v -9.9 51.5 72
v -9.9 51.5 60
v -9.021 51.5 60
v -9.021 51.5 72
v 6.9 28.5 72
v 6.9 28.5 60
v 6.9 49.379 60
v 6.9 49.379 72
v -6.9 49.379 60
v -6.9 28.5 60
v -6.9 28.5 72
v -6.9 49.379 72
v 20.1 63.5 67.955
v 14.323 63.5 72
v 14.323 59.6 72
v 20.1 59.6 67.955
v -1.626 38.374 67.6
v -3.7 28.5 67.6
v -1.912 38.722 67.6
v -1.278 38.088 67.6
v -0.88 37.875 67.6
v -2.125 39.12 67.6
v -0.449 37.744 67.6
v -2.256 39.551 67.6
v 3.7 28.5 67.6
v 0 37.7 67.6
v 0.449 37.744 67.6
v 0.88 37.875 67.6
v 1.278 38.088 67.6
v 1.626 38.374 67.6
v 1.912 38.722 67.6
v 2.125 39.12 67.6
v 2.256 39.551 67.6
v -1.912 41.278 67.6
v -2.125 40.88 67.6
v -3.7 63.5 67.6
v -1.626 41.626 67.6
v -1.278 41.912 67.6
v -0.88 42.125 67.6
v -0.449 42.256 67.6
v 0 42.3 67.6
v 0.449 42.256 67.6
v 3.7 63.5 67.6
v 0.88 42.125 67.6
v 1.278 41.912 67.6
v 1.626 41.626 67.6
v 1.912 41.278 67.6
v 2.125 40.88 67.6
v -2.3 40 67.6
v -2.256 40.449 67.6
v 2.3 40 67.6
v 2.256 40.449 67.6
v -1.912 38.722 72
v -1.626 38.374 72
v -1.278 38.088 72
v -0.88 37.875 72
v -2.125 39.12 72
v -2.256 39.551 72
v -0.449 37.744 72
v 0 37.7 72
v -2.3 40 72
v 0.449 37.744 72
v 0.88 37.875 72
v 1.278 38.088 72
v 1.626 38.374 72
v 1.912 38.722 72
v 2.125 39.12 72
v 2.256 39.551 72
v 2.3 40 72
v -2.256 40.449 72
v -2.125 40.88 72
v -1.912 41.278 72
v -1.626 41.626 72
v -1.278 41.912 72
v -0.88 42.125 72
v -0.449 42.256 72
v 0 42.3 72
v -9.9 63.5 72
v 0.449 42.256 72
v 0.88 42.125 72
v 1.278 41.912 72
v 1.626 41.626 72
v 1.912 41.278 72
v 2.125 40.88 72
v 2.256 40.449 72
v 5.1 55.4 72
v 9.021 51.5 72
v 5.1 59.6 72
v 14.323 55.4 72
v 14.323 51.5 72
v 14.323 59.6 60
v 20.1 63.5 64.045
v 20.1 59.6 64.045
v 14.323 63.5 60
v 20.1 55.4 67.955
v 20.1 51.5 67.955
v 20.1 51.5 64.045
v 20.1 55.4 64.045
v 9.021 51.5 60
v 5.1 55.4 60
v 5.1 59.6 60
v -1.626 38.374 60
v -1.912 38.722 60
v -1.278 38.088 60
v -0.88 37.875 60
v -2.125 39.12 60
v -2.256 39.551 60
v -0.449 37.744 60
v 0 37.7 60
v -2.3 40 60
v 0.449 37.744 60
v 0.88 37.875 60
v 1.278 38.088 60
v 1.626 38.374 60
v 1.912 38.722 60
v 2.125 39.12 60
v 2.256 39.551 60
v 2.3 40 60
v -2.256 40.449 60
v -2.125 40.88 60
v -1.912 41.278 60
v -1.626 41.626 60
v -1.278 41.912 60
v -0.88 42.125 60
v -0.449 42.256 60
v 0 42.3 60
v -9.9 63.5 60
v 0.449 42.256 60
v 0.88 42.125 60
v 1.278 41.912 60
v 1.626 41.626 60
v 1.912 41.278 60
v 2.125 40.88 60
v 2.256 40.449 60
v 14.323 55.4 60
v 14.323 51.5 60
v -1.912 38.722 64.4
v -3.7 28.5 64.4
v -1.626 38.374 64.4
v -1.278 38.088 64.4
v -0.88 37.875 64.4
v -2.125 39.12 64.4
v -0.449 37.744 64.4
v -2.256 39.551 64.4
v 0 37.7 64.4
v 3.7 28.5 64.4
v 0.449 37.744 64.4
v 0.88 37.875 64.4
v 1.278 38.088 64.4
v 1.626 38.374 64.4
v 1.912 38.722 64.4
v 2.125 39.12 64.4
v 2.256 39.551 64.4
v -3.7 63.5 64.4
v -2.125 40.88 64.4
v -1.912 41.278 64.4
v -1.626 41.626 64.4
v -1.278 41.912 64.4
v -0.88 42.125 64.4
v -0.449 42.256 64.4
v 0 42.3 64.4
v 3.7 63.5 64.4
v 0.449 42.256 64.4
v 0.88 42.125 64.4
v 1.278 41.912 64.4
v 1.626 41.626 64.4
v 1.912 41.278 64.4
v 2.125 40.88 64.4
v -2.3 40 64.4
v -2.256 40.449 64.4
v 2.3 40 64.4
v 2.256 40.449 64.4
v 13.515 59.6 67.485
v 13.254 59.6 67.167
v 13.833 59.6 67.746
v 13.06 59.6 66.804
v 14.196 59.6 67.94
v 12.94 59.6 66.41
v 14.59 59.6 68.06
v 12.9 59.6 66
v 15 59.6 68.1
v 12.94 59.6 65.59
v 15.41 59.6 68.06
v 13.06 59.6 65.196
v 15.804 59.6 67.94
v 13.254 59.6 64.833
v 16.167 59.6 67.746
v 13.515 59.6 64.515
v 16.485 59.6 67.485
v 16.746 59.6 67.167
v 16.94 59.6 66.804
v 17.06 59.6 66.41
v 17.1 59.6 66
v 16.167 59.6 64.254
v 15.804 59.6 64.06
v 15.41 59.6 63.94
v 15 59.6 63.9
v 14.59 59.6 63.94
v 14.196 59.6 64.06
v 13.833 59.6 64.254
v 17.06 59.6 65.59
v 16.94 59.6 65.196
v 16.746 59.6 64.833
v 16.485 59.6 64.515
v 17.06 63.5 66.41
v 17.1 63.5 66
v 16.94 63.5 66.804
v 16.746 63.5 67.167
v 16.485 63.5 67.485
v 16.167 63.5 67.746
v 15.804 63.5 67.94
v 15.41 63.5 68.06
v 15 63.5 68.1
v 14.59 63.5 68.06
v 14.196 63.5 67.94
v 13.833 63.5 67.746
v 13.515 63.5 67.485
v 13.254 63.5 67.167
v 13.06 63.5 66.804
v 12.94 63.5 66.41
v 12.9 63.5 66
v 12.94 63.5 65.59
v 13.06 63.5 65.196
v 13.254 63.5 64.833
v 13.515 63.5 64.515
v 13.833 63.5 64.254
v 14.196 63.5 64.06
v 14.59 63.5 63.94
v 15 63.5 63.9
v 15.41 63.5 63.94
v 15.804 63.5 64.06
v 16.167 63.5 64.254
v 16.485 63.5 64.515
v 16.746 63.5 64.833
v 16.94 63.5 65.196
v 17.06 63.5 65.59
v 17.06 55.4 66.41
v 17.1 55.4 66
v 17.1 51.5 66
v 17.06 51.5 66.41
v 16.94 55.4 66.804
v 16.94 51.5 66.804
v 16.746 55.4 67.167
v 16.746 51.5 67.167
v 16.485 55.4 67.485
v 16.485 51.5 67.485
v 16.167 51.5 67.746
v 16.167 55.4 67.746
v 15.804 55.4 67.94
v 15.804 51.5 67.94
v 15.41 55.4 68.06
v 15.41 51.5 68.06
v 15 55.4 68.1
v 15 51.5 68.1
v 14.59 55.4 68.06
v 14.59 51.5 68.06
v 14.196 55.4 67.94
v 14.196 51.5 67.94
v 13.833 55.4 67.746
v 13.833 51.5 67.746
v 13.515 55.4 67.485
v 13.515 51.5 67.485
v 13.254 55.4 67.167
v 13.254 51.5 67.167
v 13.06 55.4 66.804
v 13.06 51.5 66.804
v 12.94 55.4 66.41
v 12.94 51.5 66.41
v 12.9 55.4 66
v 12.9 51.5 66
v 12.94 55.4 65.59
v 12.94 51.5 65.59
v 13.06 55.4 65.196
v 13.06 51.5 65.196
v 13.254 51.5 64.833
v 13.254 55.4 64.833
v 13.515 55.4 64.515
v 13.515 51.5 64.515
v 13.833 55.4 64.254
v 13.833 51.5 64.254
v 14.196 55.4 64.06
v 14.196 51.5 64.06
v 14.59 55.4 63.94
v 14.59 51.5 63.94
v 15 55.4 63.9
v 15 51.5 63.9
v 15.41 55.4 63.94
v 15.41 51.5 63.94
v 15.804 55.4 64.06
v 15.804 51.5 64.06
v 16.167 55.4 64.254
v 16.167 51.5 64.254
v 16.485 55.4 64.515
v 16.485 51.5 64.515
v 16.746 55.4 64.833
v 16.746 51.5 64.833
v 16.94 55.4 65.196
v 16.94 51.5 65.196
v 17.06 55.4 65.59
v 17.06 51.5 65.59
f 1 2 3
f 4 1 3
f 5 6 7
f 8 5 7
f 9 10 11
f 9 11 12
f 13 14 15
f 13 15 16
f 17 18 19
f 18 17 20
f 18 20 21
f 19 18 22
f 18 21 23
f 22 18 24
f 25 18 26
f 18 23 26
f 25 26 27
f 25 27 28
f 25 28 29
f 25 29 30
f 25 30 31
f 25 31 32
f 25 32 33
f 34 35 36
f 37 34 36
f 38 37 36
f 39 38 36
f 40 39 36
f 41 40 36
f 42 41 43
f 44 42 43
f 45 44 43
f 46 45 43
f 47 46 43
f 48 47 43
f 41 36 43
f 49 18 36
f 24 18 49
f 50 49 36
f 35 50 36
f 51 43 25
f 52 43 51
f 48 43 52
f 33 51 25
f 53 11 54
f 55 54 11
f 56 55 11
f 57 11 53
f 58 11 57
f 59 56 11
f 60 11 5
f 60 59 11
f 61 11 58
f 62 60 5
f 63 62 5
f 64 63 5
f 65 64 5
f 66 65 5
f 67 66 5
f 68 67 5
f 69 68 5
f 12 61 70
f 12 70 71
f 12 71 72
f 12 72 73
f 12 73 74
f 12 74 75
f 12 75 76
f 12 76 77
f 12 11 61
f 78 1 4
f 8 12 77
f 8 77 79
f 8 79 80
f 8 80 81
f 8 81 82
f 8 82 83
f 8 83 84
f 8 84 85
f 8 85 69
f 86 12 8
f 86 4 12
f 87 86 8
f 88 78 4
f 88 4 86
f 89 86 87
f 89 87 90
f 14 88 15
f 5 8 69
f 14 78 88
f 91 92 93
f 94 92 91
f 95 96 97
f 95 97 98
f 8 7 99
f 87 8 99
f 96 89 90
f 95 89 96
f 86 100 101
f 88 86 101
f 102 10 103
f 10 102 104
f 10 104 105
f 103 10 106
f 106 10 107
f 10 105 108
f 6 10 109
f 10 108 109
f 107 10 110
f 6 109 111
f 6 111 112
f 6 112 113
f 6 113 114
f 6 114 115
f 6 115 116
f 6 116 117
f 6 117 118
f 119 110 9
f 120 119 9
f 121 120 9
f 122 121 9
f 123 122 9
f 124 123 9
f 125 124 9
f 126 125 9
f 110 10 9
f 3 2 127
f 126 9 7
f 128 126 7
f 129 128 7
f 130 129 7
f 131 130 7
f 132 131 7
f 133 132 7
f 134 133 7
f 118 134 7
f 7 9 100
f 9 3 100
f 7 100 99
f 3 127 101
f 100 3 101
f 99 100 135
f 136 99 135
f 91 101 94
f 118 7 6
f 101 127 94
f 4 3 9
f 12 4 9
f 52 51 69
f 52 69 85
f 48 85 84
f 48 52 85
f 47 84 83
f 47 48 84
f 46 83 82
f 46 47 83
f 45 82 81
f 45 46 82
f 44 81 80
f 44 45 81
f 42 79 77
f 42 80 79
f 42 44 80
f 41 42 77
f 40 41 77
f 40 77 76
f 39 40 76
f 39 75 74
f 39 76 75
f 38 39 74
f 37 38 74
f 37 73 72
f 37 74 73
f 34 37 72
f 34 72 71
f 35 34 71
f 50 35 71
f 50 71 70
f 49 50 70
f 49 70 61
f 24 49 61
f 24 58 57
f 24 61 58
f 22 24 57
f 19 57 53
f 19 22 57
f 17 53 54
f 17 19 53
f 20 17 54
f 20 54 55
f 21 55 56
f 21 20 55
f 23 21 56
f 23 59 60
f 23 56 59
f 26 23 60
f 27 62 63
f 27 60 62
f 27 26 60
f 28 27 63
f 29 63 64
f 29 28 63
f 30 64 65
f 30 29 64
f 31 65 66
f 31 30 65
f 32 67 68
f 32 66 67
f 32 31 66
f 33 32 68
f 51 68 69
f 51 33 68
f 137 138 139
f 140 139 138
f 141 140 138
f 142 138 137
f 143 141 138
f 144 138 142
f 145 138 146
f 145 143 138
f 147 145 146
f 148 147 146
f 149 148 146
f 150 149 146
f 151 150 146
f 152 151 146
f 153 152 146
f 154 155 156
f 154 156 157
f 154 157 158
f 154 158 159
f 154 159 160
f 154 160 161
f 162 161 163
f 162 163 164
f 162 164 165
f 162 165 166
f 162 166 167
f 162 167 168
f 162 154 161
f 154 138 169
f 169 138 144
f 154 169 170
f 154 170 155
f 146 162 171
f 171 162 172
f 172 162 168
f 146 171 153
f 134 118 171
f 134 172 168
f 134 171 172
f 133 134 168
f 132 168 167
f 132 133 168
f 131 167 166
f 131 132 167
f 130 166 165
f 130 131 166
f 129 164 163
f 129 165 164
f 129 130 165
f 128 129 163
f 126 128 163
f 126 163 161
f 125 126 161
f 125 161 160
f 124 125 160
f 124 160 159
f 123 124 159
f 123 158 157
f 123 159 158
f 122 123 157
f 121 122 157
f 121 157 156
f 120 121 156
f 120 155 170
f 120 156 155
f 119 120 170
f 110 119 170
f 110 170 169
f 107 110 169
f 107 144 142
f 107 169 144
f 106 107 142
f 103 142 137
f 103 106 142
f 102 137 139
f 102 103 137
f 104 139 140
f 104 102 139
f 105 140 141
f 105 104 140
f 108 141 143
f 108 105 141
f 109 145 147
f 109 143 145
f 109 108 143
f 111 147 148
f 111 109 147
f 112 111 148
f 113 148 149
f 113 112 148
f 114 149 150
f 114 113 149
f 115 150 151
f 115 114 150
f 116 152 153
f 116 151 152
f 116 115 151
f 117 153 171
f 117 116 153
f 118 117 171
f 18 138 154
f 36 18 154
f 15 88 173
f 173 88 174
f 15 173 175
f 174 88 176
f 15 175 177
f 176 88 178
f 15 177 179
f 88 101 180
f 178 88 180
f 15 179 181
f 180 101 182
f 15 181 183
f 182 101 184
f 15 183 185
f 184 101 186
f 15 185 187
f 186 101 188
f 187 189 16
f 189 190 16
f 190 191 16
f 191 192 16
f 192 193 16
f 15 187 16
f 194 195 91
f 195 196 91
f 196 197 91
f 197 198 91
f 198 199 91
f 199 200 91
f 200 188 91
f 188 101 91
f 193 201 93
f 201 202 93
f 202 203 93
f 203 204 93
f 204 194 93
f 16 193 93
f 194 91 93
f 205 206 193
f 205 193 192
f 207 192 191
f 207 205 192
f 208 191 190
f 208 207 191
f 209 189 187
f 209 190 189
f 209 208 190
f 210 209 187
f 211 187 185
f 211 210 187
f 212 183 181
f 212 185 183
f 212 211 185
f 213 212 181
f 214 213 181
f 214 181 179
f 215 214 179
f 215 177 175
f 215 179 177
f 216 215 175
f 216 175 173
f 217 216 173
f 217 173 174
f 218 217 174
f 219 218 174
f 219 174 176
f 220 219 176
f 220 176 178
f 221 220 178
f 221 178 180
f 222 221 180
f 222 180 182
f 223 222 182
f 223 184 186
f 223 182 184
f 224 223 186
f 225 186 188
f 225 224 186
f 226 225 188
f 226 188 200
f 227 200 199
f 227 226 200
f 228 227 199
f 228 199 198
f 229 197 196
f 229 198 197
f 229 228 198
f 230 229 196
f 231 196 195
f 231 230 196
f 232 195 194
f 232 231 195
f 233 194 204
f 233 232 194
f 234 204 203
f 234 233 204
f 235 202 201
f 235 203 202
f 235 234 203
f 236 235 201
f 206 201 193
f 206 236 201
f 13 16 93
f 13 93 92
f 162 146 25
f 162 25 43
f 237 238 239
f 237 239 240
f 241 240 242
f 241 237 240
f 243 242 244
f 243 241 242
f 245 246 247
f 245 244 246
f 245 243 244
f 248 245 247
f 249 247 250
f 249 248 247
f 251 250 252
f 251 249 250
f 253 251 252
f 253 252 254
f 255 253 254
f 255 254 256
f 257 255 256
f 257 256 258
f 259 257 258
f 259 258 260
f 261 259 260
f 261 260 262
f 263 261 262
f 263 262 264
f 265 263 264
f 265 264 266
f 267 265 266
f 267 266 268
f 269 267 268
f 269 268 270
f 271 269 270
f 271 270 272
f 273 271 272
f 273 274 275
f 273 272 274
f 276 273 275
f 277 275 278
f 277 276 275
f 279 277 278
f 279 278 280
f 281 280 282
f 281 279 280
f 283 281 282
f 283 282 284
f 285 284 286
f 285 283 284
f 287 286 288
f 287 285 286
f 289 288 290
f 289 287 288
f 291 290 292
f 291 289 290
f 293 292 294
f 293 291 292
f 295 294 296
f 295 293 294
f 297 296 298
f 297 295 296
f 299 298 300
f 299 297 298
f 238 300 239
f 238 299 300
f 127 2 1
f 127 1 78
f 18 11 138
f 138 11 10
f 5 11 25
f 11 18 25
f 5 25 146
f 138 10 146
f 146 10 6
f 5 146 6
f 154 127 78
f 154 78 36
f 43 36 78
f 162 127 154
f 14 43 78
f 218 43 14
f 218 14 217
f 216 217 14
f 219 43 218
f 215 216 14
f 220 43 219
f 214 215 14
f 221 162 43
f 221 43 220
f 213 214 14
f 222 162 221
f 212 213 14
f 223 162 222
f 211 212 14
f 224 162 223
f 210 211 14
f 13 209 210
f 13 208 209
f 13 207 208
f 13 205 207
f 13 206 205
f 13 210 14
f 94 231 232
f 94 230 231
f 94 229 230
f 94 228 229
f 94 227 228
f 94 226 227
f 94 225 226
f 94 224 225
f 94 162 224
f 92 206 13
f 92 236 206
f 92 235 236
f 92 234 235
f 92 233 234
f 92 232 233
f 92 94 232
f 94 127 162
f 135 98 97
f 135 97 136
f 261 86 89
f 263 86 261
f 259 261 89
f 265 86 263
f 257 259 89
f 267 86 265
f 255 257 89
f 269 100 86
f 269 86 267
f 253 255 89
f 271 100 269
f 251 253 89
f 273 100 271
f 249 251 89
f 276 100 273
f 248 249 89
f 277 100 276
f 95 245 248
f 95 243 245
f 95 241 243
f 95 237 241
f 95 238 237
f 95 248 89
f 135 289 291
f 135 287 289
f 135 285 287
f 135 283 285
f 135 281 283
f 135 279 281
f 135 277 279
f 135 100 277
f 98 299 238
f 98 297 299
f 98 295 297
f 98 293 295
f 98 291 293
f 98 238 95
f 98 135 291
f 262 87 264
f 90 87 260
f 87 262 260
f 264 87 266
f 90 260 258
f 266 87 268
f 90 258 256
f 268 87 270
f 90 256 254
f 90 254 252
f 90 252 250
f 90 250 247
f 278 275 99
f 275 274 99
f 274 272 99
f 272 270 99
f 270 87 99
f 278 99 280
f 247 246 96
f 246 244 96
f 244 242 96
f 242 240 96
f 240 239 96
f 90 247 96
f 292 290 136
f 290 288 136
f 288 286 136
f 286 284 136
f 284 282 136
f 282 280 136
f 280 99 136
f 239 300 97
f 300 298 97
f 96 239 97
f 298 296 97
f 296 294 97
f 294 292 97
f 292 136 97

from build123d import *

# Parameters (mm, degrees)
CUBE022_W                = 7.4
CUBE022_H                = 50
CUBE022_DEPTH            = 3.2
CUBE023_W                = 15
CUBE023_H                = 4.2
CUBE023_DEPTH            = 12
CYLINDER014_R            = 2.1
CYLINDER014_DEPTH        = 13
PRISM016_DEPTH           = 13
PRISM016_ROLL_ANGLE      = 90
PRISM016_PITCH_ANGLE     = 65.000022
PRISM017_DEPTH           = 13
PRISM017_ROLL_ANGLE      = -90
PRISM017_PITCH_ANGLE     = 4.999997
PRISM017_PLACEMENT_ANGLE = 180
CYLINDER013_R            = 2.3
CYLINDER013_DEPTH        = 41
PRISM014_DEPTH           = 12
PRISM014_PLACEMENT_ANGLE = 15
PRISM015_DEPTH           = 12
PRISM015_PLACEMENT_ANGLE = 75
CUBE021_W                = 30
CUBE021_H                = 12
CUBE021_DEPTH            = 12
CUBE020_W                = 13.8
CUBE020_H                = 23
CUBE020_DEPTH            = 12


with BuildPart() as cube022:
    # cube022 → cube022 (new body)
    with BuildSketch(Plane(origin=(-3.7, 15, 64.4), x_dir=(1, 0, 0), z_dir=(0, 0, 1))):
        with Locations((3.7, 25)):
            Rectangle(CUBE022_W, CUBE022_H)
    extrude(amount=CUBE022_DEPTH)


with BuildPart() as cube023:
    # cube023 → cube023 (new body)
    with BuildSketch(Plane(origin=(5.1, 55.4, 60), x_dir=(1, 0, 0), z_dir=(0, 0, 1))):
        with Locations((7.5, 2.1)):
            Rectangle(CUBE023_W, CUBE023_H)
    extrude(amount=CUBE023_DEPTH)


with BuildPart() as cylinder014:
    # cylinder014 → cylinder014 (new body)
    with BuildSketch(Plane(origin=(15, 64, 66), x_dir=(1, 0, 0), z_dir=(0, -1, 0))):
        Circle(CYLINDER014_R)
    extrude(amount=CYLINDER014_DEPTH)


with BuildPart() as prism016:
    # prism016 → prism016 (new body)
    with BuildSketch(Plane.XY):
        Polygon((5.25, 0), (-2.625, 4.546633), (-2.625, -4.546633), align=None)
    extrude(amount=PRISM016_DEPTH)


with BuildPart() as prism016_1:
    # prism016 roll: moved
    add(prism016.part.rotate(Axis((0, 0, 0), (1, 0, 0)), PRISM016_ROLL_ANGLE))


with BuildPart() as prism016_2:
    # prism016 pitch: moved
    add(prism016_1.part.rotate(Axis((0, 0, 0), (0, 1, 0)), PRISM016_PITCH_ANGLE))


with BuildPart() as prism016_3:
    # prism016 placement: moved
    add(prism016_2.part.moved(Location((18.9, 64, 72))))


with BuildPart() as prism017:
    # prism017 → prism017 (new body)
    with BuildSketch(Plane.XY):
        Polygon((5.25, 0), (-2.625, 4.546633), (-2.625, -4.546633), align=None)
    extrude(amount=PRISM017_DEPTH)


with BuildPart() as prism017_1:
    # prism017 roll: moved
    add(prism017.part.rotate(Axis((0, 0, 0), (1, 0, 0)), PRISM017_ROLL_ANGLE))


with BuildPart() as prism017_2:
    # prism017 pitch: moved
    add(prism017_1.part.rotate(Axis((0, 0, 0), (0, 1, 0)), PRISM017_PITCH_ANGLE))


with BuildPart() as prism017_3:
    # prism017 placement: moved
    add(prism017_2.part.moved(Location((18.9, 64.000001, 60))).rotate(Axis((18.9, 64.000001, 60), (0, 0, 1)), PRISM017_PLACEMENT_ANGLE))


with BuildPart() as group009:
    # cylinder013 → cylinder013 (new body)
    with BuildSketch(Plane(origin=(0, 40, 51.5), x_dir=(1, 0, 0), z_dir=(0, 0, 1))):
        Circle(CYLINDER013_R)
    extrude(amount=CYLINDER013_DEPTH)

    # Group009: union cube022, cube023, cylinder014, prism016, prism017
    add(cube022.part)
    add(cube023.part)
    add(cylinder014.part)
    add(prism016_3.part)
    add(prism017_3.part)


with BuildPart() as prism014:
    # prism014 → prism014 (new body)
    with BuildSketch(Plane.XY):
        Polygon((3, 0), (-1.5, 2.598076), (-1.5, -2.598076), align=None)
    extrude(amount=PRISM014_DEPTH)


with BuildPart() as prism014_1:
    # prism014 placement: moved
    add(prism014.part.moved(Location((7, 51.6, 60))).rotate(Axis((7, 51.6, 60), (0, 0, 1)), PRISM014_PLACEMENT_ANGLE))


with BuildPart() as prism015:
    # prism015 → prism015 (new body)
    with BuildSketch(Plane.XY):
        Polygon((3, 0), (-1.5, 2.598076), (-1.5, -2.598076), align=None)
    extrude(amount=PRISM015_DEPTH)


with BuildPart() as prism015_1:
    # prism015 placement: moved
    add(prism015.part.moved(Location((-7, 51.6, 60))).rotate(Axis((-7, 51.6, 60), (0, 0, -1)), PRISM015_PLACEMENT_ANGLE))


with BuildPart() as cube021:
    # cube021 → cube021 (new body)
    with BuildSketch(Plane(origin=(-9.9, 51.5, 60), x_dir=(1, 0, 0), z_dir=(0, 0, 1))):
        with Locations((15, 6)):
            Rectangle(CUBE021_W, CUBE021_H)
    extrude(amount=CUBE021_DEPTH)


with BuildPart() as updown001:
    # cube020 → cube020 (new body)
    with BuildSketch(Plane(origin=(-6.9, 28.5, 60), x_dir=(1, 0, 0), z_dir=(0, 0, 1))):
        with Locations((6.9, 11.5)):
            Rectangle(CUBE020_W, CUBE020_H)
    extrude(amount=CUBE020_DEPTH)

    # Group008: union prism014, prism015, cube021
    add(prism014_1.part)
    add(prism015_1.part)
    add(cube021.part)

    # difference005: cut Group009
    add(group009.part, mode=Mode.SUBTRACT)


solid = updown001.part
